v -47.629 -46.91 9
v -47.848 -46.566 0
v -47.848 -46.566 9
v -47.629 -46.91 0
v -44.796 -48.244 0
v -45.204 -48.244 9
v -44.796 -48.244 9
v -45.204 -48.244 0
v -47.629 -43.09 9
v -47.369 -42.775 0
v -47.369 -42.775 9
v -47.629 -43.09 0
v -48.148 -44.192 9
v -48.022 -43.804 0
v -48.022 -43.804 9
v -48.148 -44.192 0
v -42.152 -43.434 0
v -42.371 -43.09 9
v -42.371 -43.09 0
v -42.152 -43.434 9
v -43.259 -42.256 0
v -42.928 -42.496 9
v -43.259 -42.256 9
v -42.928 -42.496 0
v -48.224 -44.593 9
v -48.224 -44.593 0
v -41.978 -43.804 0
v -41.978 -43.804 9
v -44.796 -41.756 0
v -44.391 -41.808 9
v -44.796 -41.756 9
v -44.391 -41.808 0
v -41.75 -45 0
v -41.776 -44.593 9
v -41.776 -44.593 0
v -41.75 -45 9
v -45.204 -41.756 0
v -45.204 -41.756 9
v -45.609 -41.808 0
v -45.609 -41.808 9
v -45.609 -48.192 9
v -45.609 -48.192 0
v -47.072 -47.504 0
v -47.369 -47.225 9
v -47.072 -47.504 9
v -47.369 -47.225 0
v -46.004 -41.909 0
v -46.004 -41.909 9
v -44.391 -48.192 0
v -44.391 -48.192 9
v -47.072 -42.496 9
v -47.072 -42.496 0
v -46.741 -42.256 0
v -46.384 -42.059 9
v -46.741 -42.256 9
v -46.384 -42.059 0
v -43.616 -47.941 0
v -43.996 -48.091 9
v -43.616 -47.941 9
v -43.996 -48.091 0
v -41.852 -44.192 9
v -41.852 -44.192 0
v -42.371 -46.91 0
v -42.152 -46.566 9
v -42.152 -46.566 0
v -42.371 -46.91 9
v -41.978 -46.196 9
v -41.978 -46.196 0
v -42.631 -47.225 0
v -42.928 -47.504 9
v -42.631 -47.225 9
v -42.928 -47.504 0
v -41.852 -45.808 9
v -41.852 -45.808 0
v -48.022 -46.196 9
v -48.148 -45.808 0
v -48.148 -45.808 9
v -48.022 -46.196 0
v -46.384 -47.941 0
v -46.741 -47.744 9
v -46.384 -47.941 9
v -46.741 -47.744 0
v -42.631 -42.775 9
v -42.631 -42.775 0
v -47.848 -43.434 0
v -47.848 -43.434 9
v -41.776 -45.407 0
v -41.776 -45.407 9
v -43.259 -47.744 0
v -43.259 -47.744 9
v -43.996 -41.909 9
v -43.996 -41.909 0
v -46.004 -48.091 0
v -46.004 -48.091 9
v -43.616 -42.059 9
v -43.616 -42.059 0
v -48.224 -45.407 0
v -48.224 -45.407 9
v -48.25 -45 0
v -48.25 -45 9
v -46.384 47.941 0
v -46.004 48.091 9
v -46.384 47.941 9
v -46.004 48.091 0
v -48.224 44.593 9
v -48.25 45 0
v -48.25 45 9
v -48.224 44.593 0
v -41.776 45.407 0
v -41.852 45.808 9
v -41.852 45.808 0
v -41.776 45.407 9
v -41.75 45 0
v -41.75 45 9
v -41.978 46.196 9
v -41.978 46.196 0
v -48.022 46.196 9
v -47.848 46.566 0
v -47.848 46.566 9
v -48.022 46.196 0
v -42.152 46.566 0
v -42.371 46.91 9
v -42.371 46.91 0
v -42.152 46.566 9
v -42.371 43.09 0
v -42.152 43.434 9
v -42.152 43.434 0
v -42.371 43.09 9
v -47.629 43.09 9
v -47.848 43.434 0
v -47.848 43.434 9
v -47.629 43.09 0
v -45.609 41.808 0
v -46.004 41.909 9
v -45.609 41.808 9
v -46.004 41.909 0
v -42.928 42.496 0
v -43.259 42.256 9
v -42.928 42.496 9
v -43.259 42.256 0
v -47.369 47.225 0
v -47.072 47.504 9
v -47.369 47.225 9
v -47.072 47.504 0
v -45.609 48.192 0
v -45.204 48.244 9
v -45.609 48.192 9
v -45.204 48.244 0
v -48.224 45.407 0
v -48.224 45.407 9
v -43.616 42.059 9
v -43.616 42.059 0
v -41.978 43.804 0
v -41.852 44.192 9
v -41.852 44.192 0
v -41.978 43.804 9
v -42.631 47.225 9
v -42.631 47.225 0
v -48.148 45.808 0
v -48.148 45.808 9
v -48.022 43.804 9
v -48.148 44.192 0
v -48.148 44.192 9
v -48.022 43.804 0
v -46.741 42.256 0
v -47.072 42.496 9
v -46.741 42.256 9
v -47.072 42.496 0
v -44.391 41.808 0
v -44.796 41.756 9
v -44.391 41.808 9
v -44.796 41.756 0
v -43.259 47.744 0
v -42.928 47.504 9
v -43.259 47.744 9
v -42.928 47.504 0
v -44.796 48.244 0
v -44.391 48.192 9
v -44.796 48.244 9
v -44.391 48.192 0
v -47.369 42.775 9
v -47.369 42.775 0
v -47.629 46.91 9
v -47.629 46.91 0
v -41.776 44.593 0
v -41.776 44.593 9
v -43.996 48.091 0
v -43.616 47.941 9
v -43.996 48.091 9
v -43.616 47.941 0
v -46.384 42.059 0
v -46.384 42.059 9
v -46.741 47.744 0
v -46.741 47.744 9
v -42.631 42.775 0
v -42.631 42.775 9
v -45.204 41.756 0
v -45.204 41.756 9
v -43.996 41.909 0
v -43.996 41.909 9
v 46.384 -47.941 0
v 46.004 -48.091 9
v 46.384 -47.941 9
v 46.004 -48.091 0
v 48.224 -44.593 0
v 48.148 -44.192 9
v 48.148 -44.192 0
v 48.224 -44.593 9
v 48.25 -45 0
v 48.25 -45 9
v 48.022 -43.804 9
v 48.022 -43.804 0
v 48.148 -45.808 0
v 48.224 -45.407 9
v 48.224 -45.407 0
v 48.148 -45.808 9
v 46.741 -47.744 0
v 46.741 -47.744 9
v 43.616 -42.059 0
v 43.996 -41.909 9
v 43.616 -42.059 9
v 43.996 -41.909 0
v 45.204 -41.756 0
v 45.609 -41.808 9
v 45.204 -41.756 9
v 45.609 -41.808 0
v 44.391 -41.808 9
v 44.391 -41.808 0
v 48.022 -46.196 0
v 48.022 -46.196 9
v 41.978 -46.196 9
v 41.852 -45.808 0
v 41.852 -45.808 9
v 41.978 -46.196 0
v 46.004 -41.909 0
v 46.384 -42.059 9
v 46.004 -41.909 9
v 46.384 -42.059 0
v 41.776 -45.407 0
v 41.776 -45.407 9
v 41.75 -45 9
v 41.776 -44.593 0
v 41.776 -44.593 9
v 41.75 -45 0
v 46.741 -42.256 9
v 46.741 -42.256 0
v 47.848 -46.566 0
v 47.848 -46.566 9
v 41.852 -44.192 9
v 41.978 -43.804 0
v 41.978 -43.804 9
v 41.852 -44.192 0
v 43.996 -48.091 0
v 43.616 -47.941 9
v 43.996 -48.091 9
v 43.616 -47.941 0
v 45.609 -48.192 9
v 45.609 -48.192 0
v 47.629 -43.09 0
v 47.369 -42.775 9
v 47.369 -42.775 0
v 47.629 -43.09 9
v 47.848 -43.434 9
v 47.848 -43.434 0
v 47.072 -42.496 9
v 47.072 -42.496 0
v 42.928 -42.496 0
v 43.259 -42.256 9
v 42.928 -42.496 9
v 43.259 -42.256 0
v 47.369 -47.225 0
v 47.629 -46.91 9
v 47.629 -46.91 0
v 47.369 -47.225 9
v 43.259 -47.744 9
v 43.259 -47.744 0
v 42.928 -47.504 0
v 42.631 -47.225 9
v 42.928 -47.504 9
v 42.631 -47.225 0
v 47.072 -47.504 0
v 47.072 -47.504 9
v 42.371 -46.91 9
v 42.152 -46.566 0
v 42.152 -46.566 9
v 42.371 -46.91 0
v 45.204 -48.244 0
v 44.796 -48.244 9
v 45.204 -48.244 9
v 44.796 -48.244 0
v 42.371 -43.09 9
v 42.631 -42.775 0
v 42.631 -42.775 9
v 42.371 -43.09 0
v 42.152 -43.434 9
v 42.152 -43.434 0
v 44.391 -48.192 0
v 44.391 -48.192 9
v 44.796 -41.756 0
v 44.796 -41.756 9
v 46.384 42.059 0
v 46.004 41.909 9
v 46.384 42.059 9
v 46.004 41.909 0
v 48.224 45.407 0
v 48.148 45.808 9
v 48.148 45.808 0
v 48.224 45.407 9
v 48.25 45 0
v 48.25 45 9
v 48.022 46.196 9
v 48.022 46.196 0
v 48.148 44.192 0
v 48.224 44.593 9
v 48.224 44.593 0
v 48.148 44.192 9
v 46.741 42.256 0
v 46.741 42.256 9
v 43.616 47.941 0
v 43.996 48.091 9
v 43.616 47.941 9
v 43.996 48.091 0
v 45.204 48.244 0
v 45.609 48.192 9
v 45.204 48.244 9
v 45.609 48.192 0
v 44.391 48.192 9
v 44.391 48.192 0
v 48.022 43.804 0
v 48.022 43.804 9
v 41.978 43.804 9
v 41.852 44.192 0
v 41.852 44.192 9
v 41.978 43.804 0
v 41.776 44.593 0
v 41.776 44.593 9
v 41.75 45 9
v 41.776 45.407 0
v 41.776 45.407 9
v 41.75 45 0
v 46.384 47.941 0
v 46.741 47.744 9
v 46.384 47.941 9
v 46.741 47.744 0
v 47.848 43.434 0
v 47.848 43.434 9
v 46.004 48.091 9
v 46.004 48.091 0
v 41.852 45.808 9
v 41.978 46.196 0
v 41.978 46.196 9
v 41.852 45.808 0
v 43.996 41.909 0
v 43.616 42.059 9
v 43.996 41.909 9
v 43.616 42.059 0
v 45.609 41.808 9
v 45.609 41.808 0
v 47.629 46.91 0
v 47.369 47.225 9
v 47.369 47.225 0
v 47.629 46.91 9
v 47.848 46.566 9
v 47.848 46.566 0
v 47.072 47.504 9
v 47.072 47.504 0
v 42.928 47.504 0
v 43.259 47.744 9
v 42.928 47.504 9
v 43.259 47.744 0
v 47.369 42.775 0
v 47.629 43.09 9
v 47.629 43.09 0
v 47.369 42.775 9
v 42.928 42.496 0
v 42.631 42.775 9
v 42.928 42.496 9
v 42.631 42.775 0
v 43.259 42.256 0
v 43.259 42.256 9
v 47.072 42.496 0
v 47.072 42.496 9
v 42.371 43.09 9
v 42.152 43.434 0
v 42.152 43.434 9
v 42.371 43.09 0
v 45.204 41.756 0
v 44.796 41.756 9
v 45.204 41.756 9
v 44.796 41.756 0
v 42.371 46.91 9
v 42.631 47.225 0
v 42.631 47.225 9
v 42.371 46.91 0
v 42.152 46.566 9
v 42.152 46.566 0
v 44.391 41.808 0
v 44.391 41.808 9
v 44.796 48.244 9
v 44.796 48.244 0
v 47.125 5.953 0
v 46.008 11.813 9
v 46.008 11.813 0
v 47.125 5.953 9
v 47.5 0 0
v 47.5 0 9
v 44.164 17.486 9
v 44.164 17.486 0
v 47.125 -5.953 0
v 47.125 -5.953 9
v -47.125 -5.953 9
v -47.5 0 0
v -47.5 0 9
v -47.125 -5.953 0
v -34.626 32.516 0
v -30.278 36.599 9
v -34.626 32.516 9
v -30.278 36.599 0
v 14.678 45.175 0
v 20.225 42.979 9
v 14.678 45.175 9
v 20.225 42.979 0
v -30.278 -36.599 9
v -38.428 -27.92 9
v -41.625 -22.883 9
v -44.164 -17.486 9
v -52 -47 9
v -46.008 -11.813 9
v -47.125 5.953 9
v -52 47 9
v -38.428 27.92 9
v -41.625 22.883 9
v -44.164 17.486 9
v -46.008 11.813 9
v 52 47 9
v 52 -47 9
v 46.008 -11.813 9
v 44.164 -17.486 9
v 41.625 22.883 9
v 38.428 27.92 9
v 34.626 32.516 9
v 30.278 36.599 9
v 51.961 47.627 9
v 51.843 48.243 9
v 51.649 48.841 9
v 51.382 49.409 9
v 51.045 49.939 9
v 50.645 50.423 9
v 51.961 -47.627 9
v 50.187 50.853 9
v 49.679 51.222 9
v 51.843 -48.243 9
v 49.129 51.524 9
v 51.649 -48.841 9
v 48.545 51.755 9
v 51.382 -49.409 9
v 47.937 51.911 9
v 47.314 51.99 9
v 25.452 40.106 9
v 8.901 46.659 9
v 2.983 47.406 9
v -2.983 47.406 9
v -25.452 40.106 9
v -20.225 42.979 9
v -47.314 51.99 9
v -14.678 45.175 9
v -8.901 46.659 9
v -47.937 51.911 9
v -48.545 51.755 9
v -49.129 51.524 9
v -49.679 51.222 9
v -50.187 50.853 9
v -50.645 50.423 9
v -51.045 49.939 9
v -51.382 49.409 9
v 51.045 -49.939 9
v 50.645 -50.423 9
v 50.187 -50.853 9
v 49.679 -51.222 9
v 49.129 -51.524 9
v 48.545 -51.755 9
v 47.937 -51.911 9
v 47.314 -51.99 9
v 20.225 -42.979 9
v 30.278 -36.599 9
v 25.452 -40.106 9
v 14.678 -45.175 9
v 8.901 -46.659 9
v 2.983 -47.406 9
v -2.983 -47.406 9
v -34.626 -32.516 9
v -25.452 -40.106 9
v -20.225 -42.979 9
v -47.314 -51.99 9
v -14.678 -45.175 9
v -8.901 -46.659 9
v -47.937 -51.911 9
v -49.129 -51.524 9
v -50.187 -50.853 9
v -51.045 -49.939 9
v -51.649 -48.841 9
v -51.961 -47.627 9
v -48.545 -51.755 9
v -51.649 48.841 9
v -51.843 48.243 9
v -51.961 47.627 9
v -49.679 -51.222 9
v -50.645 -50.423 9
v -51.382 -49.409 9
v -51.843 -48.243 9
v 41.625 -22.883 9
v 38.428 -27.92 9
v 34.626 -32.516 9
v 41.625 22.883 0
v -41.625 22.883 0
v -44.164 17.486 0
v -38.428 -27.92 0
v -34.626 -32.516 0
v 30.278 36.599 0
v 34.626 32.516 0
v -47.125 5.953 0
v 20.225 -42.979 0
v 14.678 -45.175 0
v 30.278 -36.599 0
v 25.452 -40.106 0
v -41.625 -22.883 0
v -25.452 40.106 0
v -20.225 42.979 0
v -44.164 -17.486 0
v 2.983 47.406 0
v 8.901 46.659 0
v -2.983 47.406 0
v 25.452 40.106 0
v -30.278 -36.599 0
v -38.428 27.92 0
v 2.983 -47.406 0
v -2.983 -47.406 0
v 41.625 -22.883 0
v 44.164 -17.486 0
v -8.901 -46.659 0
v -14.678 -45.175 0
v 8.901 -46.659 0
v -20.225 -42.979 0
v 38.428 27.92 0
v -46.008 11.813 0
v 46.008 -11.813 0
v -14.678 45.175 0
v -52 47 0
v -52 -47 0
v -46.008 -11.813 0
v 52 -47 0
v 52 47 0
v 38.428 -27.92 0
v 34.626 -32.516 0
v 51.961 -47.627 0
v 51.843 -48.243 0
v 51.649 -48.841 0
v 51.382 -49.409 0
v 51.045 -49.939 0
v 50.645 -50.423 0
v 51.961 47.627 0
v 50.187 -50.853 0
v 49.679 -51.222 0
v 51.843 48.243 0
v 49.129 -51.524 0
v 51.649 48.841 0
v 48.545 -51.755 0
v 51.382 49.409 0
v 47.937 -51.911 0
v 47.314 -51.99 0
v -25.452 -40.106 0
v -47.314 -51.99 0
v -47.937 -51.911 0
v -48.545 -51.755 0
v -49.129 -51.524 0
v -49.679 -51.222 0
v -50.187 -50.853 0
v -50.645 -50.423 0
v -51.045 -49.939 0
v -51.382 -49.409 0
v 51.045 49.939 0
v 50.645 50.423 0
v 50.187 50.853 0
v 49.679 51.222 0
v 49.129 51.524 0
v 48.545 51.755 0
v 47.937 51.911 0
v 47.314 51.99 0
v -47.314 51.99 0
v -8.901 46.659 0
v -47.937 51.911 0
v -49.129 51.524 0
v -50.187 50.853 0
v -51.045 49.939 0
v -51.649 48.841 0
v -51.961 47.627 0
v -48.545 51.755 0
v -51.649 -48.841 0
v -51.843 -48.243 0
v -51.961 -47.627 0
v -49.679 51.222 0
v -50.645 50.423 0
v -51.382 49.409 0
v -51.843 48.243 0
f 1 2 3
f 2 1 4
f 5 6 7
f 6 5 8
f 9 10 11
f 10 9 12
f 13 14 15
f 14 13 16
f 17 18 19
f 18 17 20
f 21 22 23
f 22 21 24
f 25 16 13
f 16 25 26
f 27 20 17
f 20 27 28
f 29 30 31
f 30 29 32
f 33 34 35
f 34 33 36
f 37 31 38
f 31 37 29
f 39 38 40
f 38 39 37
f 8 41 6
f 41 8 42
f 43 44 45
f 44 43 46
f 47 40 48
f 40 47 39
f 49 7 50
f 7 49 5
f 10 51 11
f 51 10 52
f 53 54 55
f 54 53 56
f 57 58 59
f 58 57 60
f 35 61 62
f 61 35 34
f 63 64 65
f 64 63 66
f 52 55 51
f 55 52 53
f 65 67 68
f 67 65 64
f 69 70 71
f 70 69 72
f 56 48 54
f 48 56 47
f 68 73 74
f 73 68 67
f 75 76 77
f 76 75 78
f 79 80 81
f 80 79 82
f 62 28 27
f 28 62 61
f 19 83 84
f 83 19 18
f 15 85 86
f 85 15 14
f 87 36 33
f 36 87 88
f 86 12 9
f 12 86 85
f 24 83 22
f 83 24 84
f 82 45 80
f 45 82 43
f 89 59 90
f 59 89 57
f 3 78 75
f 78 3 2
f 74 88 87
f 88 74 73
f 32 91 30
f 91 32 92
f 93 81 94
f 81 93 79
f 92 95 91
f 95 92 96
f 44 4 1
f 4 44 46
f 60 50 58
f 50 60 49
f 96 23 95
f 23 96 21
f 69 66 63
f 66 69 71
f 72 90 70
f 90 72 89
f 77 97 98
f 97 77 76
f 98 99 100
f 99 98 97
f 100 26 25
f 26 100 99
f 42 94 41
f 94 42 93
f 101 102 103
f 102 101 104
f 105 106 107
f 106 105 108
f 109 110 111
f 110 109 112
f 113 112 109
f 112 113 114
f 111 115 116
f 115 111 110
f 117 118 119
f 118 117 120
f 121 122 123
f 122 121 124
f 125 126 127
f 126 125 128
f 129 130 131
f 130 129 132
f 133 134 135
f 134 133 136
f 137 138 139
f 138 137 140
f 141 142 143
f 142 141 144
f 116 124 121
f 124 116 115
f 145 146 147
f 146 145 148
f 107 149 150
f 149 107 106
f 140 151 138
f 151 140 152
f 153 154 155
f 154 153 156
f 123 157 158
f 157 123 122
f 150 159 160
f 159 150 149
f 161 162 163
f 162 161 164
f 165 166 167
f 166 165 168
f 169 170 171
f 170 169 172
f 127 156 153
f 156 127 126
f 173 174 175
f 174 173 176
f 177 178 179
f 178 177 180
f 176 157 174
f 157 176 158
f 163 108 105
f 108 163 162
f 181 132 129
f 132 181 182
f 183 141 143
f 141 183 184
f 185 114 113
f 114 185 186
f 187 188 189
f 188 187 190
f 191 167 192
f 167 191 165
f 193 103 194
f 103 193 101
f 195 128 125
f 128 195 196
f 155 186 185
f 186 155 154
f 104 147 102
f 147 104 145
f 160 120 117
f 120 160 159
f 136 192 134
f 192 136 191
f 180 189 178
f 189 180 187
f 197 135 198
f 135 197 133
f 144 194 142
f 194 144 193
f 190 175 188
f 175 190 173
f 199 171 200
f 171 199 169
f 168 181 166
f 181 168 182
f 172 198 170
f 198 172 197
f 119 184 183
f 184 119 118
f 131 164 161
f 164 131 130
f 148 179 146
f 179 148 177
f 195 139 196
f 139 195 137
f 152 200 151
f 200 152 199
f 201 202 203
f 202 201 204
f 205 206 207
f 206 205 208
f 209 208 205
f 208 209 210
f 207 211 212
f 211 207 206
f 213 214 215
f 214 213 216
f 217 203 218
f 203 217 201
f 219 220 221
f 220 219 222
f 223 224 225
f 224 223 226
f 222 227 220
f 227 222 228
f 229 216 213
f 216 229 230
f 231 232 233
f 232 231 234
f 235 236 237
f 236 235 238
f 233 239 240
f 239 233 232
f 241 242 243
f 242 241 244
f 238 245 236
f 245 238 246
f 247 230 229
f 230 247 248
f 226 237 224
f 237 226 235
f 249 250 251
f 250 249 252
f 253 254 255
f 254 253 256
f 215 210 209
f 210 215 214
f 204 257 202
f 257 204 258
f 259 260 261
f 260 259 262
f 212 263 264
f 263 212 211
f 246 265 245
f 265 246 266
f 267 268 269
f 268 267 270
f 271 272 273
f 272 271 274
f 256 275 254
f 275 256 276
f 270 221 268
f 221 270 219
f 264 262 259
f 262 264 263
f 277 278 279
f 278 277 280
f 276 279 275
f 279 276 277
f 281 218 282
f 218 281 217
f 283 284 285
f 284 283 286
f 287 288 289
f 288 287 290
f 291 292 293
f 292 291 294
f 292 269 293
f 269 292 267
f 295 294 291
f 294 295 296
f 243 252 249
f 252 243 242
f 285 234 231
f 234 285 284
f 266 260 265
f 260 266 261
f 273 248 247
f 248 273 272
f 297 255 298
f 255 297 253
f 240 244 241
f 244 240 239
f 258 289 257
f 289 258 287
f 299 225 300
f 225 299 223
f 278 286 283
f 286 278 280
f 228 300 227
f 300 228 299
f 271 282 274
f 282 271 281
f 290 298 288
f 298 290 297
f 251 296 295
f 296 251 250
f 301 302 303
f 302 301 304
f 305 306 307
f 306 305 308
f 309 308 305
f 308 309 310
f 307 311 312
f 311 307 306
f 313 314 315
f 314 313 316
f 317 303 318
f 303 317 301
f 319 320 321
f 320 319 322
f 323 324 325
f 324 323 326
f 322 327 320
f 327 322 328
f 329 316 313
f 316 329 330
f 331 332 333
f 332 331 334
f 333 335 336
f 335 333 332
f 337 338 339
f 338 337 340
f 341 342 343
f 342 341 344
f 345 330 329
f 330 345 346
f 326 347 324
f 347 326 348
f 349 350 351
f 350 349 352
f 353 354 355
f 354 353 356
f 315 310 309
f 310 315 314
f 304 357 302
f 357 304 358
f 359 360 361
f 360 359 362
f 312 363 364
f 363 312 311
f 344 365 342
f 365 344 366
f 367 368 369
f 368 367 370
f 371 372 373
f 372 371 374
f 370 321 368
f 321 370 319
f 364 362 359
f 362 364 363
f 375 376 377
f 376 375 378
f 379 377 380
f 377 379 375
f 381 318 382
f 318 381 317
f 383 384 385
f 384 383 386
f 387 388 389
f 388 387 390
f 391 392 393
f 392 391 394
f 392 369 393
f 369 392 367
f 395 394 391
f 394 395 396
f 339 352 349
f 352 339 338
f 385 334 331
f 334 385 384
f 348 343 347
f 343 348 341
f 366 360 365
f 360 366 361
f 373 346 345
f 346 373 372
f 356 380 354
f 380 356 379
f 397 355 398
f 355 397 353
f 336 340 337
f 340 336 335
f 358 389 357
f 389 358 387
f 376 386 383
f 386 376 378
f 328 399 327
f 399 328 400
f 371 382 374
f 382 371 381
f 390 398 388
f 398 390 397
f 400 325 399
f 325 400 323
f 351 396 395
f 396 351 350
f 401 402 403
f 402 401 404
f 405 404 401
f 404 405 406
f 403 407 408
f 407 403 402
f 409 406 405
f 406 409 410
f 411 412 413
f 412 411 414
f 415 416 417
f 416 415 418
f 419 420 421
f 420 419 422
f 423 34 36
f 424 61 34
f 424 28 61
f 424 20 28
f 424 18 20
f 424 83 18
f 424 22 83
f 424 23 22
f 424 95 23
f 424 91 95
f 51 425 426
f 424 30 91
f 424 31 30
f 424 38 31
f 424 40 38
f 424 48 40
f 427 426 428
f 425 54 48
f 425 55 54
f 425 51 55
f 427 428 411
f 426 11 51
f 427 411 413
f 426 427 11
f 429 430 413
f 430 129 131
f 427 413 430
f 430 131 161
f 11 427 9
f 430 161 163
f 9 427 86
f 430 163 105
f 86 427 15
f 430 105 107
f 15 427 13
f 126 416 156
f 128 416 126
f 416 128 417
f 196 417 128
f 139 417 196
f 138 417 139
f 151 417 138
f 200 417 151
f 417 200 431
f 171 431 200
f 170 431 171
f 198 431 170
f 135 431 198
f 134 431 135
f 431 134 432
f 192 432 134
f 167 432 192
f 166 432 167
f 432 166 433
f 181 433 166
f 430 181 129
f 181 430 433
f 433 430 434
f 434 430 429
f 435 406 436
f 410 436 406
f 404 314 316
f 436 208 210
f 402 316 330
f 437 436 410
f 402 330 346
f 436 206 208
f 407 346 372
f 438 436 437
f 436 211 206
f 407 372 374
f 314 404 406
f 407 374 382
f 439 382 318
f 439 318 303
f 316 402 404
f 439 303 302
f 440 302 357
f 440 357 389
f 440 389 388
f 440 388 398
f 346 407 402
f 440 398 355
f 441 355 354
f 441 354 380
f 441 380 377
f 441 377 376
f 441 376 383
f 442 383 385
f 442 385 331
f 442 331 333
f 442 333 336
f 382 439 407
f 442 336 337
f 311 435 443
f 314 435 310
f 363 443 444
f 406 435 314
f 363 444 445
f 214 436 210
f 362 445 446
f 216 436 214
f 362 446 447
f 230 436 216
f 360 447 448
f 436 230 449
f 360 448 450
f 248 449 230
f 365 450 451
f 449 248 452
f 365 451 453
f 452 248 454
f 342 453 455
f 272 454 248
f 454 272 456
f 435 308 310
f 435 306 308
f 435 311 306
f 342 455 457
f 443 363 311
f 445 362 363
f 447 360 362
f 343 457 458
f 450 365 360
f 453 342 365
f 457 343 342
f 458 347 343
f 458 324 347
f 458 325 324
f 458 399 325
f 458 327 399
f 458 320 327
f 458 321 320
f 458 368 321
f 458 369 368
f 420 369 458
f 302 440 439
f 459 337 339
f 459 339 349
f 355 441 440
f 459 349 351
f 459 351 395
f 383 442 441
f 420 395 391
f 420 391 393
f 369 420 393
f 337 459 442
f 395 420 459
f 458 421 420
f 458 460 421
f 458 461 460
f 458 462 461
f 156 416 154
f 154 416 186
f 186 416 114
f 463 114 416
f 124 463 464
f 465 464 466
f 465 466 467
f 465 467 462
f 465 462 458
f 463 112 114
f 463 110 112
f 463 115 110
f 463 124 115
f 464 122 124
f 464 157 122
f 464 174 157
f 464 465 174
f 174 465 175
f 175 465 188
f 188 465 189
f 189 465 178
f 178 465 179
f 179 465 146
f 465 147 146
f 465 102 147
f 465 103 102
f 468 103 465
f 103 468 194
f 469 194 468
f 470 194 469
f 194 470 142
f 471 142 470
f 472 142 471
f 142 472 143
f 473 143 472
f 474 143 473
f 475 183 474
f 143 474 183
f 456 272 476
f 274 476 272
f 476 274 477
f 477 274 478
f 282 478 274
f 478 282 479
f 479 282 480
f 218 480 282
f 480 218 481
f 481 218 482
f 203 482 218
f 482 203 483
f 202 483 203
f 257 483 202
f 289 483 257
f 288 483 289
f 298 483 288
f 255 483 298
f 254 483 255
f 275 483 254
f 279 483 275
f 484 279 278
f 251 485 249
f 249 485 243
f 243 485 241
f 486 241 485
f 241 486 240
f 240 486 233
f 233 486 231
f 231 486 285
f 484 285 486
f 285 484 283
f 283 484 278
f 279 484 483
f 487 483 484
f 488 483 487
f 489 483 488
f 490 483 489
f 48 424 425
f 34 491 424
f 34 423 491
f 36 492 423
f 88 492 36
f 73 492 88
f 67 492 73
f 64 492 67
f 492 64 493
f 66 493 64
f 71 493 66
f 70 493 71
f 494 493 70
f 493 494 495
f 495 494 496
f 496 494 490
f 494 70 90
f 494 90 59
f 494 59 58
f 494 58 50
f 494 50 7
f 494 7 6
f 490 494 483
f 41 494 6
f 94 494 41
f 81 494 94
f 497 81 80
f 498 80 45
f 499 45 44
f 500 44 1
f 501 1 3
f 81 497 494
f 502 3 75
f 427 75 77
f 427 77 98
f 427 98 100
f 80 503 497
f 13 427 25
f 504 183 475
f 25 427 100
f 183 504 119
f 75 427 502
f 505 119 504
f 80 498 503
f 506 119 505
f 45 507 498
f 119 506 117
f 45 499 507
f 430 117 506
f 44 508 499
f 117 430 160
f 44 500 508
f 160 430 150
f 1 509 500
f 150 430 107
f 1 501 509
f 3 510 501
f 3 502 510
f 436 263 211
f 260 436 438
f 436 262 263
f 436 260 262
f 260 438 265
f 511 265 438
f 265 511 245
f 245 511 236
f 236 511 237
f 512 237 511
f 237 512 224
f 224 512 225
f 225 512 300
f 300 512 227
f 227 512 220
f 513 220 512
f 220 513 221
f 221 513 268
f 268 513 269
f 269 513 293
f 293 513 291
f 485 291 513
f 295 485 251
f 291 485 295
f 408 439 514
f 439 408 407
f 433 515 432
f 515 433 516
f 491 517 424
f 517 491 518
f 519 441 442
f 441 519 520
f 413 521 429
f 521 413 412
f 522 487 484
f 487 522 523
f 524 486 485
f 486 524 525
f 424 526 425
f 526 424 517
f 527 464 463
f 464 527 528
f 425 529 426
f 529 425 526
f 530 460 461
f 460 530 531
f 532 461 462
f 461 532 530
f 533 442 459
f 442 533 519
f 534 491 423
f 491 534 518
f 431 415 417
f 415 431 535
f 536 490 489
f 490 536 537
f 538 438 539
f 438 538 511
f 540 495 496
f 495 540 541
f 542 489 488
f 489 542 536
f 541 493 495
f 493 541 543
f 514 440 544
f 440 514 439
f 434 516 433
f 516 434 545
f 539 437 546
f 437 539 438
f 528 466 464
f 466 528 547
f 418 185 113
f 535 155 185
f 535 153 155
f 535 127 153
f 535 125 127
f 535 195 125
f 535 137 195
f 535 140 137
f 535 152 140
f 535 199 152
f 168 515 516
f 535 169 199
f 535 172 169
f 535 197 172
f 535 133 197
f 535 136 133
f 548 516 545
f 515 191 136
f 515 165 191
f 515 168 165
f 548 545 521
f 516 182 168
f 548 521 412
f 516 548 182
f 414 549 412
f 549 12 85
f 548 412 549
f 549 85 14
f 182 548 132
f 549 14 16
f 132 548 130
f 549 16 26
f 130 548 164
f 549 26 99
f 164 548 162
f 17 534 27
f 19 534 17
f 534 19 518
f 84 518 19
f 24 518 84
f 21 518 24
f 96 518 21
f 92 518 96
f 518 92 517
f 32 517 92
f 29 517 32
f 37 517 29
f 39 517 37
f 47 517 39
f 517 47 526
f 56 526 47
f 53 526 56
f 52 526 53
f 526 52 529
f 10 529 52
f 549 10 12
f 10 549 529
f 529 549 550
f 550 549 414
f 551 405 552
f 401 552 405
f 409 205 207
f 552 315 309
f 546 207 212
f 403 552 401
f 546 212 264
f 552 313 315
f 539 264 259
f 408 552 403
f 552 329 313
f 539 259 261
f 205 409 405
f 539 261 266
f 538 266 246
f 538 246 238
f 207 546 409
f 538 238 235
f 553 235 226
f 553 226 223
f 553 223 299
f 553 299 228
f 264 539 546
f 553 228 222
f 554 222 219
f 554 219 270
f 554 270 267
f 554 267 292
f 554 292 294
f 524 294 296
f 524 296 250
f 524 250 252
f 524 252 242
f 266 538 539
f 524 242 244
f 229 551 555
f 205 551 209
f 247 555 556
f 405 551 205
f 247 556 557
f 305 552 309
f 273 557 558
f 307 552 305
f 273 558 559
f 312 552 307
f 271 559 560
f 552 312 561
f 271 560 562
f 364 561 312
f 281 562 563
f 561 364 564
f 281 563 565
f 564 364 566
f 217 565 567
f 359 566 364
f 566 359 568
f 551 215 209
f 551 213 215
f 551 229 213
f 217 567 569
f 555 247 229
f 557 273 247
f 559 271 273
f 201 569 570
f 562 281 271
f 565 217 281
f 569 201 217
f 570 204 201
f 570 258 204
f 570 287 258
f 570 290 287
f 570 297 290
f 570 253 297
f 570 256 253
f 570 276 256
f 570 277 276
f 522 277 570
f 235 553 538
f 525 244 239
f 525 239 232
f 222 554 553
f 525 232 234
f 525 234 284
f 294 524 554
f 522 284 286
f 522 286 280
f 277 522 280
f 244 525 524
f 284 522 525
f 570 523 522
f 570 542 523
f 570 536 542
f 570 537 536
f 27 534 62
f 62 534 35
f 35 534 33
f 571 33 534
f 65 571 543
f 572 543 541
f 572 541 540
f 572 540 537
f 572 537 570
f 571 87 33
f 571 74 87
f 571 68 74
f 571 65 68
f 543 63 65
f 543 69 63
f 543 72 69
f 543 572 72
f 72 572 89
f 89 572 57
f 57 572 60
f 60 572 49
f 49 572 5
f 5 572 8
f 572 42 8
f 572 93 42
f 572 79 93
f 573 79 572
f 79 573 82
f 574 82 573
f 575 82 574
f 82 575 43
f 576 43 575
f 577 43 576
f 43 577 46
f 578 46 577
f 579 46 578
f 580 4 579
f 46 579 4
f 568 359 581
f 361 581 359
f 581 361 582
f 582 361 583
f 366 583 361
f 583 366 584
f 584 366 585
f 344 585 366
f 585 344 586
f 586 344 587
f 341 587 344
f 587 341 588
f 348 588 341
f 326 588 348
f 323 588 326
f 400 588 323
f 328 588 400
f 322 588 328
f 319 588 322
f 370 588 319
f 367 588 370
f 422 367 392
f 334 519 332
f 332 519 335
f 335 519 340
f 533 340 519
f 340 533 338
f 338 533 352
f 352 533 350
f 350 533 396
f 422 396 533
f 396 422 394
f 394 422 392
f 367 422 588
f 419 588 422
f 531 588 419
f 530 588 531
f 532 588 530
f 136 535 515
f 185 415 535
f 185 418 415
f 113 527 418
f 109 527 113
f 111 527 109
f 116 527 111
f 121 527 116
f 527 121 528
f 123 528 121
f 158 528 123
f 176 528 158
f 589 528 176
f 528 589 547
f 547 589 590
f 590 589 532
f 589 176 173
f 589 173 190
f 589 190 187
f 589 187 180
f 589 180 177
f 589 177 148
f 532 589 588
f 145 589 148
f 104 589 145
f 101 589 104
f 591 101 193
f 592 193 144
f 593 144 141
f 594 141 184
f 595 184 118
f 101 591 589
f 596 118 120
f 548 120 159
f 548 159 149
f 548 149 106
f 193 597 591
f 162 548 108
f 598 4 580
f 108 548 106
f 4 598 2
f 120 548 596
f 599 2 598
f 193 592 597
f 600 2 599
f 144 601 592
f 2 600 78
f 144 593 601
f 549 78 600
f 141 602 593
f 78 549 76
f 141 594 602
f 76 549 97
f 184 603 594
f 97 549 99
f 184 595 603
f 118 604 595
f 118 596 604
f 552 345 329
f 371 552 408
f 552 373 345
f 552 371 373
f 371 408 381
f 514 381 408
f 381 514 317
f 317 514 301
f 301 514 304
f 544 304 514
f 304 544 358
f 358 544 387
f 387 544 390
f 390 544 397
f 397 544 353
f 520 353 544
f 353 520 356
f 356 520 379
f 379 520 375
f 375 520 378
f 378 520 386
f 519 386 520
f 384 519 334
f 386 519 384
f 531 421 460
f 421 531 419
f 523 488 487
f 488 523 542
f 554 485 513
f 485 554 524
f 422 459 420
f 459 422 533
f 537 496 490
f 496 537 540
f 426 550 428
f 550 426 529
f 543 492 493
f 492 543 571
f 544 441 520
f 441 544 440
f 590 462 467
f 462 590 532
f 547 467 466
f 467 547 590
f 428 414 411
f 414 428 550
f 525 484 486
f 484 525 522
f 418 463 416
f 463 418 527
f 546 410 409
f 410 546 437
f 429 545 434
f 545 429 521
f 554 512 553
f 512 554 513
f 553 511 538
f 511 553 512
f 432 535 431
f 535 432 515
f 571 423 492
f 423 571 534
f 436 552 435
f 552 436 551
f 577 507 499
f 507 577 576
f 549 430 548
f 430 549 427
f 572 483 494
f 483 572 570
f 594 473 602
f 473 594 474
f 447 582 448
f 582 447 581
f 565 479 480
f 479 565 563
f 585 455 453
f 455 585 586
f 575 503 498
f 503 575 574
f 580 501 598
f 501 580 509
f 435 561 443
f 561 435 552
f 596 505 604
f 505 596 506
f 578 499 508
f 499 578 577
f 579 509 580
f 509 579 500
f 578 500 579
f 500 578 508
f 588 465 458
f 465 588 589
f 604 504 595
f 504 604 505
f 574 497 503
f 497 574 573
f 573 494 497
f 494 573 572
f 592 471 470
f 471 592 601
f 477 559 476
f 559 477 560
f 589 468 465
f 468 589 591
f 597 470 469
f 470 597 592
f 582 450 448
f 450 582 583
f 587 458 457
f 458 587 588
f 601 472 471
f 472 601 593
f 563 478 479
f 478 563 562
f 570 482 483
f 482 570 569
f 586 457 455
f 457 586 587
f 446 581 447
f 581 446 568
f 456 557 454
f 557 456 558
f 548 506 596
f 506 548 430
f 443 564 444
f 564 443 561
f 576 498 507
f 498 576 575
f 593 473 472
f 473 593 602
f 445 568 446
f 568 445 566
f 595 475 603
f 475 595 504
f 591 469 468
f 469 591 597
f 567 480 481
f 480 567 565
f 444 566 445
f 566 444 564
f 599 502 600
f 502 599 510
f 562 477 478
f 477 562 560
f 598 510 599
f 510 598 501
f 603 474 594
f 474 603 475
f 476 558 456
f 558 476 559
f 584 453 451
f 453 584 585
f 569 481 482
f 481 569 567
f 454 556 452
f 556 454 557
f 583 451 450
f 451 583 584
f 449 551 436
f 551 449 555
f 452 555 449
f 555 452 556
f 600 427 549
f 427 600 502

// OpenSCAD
$fn = 50;


difference() {
	union() {
		hull() {
			translate(v = [-47.0000000000, 47.0000000000, 0]) {
				cylinder(h = 9, r = 5);
			}
			translate(v = [47.0000000000, 47.0000000000, 0]) {
				cylinder(h = 9, r = 5);
			}
			translate(v = [-47.0000000000, -47.0000000000, 0]) {
				cylinder(h = 9, r = 5);
			}
			translate(v = [47.0000000000, -47.0000000000, 0]) {
				cylinder(h = 9, r = 5);
			}
		}
	}
	union() {
		#translate(v = [-45.0000000000, -45.0000000000, -100.0000000000]) {
			cylinder(h = 200, r = 3.2500000000);
		}
		#translate(v = [-45.0000000000, 45.0000000000, -100.0000000000]) {
			cylinder(h = 200, r = 3.2500000000);
		}
		#translate(v = [45.0000000000, -45.0000000000, -100.0000000000]) {
			cylinder(h = 200, r = 3.2500000000);
		}
		#translate(v = [45.0000000000, 45.0000000000, -100.0000000000]) {
			cylinder(h = 200, r = 3.2500000000);
		}
		#cylinder(h = 9, r = 47.5000000000);
	}
}
